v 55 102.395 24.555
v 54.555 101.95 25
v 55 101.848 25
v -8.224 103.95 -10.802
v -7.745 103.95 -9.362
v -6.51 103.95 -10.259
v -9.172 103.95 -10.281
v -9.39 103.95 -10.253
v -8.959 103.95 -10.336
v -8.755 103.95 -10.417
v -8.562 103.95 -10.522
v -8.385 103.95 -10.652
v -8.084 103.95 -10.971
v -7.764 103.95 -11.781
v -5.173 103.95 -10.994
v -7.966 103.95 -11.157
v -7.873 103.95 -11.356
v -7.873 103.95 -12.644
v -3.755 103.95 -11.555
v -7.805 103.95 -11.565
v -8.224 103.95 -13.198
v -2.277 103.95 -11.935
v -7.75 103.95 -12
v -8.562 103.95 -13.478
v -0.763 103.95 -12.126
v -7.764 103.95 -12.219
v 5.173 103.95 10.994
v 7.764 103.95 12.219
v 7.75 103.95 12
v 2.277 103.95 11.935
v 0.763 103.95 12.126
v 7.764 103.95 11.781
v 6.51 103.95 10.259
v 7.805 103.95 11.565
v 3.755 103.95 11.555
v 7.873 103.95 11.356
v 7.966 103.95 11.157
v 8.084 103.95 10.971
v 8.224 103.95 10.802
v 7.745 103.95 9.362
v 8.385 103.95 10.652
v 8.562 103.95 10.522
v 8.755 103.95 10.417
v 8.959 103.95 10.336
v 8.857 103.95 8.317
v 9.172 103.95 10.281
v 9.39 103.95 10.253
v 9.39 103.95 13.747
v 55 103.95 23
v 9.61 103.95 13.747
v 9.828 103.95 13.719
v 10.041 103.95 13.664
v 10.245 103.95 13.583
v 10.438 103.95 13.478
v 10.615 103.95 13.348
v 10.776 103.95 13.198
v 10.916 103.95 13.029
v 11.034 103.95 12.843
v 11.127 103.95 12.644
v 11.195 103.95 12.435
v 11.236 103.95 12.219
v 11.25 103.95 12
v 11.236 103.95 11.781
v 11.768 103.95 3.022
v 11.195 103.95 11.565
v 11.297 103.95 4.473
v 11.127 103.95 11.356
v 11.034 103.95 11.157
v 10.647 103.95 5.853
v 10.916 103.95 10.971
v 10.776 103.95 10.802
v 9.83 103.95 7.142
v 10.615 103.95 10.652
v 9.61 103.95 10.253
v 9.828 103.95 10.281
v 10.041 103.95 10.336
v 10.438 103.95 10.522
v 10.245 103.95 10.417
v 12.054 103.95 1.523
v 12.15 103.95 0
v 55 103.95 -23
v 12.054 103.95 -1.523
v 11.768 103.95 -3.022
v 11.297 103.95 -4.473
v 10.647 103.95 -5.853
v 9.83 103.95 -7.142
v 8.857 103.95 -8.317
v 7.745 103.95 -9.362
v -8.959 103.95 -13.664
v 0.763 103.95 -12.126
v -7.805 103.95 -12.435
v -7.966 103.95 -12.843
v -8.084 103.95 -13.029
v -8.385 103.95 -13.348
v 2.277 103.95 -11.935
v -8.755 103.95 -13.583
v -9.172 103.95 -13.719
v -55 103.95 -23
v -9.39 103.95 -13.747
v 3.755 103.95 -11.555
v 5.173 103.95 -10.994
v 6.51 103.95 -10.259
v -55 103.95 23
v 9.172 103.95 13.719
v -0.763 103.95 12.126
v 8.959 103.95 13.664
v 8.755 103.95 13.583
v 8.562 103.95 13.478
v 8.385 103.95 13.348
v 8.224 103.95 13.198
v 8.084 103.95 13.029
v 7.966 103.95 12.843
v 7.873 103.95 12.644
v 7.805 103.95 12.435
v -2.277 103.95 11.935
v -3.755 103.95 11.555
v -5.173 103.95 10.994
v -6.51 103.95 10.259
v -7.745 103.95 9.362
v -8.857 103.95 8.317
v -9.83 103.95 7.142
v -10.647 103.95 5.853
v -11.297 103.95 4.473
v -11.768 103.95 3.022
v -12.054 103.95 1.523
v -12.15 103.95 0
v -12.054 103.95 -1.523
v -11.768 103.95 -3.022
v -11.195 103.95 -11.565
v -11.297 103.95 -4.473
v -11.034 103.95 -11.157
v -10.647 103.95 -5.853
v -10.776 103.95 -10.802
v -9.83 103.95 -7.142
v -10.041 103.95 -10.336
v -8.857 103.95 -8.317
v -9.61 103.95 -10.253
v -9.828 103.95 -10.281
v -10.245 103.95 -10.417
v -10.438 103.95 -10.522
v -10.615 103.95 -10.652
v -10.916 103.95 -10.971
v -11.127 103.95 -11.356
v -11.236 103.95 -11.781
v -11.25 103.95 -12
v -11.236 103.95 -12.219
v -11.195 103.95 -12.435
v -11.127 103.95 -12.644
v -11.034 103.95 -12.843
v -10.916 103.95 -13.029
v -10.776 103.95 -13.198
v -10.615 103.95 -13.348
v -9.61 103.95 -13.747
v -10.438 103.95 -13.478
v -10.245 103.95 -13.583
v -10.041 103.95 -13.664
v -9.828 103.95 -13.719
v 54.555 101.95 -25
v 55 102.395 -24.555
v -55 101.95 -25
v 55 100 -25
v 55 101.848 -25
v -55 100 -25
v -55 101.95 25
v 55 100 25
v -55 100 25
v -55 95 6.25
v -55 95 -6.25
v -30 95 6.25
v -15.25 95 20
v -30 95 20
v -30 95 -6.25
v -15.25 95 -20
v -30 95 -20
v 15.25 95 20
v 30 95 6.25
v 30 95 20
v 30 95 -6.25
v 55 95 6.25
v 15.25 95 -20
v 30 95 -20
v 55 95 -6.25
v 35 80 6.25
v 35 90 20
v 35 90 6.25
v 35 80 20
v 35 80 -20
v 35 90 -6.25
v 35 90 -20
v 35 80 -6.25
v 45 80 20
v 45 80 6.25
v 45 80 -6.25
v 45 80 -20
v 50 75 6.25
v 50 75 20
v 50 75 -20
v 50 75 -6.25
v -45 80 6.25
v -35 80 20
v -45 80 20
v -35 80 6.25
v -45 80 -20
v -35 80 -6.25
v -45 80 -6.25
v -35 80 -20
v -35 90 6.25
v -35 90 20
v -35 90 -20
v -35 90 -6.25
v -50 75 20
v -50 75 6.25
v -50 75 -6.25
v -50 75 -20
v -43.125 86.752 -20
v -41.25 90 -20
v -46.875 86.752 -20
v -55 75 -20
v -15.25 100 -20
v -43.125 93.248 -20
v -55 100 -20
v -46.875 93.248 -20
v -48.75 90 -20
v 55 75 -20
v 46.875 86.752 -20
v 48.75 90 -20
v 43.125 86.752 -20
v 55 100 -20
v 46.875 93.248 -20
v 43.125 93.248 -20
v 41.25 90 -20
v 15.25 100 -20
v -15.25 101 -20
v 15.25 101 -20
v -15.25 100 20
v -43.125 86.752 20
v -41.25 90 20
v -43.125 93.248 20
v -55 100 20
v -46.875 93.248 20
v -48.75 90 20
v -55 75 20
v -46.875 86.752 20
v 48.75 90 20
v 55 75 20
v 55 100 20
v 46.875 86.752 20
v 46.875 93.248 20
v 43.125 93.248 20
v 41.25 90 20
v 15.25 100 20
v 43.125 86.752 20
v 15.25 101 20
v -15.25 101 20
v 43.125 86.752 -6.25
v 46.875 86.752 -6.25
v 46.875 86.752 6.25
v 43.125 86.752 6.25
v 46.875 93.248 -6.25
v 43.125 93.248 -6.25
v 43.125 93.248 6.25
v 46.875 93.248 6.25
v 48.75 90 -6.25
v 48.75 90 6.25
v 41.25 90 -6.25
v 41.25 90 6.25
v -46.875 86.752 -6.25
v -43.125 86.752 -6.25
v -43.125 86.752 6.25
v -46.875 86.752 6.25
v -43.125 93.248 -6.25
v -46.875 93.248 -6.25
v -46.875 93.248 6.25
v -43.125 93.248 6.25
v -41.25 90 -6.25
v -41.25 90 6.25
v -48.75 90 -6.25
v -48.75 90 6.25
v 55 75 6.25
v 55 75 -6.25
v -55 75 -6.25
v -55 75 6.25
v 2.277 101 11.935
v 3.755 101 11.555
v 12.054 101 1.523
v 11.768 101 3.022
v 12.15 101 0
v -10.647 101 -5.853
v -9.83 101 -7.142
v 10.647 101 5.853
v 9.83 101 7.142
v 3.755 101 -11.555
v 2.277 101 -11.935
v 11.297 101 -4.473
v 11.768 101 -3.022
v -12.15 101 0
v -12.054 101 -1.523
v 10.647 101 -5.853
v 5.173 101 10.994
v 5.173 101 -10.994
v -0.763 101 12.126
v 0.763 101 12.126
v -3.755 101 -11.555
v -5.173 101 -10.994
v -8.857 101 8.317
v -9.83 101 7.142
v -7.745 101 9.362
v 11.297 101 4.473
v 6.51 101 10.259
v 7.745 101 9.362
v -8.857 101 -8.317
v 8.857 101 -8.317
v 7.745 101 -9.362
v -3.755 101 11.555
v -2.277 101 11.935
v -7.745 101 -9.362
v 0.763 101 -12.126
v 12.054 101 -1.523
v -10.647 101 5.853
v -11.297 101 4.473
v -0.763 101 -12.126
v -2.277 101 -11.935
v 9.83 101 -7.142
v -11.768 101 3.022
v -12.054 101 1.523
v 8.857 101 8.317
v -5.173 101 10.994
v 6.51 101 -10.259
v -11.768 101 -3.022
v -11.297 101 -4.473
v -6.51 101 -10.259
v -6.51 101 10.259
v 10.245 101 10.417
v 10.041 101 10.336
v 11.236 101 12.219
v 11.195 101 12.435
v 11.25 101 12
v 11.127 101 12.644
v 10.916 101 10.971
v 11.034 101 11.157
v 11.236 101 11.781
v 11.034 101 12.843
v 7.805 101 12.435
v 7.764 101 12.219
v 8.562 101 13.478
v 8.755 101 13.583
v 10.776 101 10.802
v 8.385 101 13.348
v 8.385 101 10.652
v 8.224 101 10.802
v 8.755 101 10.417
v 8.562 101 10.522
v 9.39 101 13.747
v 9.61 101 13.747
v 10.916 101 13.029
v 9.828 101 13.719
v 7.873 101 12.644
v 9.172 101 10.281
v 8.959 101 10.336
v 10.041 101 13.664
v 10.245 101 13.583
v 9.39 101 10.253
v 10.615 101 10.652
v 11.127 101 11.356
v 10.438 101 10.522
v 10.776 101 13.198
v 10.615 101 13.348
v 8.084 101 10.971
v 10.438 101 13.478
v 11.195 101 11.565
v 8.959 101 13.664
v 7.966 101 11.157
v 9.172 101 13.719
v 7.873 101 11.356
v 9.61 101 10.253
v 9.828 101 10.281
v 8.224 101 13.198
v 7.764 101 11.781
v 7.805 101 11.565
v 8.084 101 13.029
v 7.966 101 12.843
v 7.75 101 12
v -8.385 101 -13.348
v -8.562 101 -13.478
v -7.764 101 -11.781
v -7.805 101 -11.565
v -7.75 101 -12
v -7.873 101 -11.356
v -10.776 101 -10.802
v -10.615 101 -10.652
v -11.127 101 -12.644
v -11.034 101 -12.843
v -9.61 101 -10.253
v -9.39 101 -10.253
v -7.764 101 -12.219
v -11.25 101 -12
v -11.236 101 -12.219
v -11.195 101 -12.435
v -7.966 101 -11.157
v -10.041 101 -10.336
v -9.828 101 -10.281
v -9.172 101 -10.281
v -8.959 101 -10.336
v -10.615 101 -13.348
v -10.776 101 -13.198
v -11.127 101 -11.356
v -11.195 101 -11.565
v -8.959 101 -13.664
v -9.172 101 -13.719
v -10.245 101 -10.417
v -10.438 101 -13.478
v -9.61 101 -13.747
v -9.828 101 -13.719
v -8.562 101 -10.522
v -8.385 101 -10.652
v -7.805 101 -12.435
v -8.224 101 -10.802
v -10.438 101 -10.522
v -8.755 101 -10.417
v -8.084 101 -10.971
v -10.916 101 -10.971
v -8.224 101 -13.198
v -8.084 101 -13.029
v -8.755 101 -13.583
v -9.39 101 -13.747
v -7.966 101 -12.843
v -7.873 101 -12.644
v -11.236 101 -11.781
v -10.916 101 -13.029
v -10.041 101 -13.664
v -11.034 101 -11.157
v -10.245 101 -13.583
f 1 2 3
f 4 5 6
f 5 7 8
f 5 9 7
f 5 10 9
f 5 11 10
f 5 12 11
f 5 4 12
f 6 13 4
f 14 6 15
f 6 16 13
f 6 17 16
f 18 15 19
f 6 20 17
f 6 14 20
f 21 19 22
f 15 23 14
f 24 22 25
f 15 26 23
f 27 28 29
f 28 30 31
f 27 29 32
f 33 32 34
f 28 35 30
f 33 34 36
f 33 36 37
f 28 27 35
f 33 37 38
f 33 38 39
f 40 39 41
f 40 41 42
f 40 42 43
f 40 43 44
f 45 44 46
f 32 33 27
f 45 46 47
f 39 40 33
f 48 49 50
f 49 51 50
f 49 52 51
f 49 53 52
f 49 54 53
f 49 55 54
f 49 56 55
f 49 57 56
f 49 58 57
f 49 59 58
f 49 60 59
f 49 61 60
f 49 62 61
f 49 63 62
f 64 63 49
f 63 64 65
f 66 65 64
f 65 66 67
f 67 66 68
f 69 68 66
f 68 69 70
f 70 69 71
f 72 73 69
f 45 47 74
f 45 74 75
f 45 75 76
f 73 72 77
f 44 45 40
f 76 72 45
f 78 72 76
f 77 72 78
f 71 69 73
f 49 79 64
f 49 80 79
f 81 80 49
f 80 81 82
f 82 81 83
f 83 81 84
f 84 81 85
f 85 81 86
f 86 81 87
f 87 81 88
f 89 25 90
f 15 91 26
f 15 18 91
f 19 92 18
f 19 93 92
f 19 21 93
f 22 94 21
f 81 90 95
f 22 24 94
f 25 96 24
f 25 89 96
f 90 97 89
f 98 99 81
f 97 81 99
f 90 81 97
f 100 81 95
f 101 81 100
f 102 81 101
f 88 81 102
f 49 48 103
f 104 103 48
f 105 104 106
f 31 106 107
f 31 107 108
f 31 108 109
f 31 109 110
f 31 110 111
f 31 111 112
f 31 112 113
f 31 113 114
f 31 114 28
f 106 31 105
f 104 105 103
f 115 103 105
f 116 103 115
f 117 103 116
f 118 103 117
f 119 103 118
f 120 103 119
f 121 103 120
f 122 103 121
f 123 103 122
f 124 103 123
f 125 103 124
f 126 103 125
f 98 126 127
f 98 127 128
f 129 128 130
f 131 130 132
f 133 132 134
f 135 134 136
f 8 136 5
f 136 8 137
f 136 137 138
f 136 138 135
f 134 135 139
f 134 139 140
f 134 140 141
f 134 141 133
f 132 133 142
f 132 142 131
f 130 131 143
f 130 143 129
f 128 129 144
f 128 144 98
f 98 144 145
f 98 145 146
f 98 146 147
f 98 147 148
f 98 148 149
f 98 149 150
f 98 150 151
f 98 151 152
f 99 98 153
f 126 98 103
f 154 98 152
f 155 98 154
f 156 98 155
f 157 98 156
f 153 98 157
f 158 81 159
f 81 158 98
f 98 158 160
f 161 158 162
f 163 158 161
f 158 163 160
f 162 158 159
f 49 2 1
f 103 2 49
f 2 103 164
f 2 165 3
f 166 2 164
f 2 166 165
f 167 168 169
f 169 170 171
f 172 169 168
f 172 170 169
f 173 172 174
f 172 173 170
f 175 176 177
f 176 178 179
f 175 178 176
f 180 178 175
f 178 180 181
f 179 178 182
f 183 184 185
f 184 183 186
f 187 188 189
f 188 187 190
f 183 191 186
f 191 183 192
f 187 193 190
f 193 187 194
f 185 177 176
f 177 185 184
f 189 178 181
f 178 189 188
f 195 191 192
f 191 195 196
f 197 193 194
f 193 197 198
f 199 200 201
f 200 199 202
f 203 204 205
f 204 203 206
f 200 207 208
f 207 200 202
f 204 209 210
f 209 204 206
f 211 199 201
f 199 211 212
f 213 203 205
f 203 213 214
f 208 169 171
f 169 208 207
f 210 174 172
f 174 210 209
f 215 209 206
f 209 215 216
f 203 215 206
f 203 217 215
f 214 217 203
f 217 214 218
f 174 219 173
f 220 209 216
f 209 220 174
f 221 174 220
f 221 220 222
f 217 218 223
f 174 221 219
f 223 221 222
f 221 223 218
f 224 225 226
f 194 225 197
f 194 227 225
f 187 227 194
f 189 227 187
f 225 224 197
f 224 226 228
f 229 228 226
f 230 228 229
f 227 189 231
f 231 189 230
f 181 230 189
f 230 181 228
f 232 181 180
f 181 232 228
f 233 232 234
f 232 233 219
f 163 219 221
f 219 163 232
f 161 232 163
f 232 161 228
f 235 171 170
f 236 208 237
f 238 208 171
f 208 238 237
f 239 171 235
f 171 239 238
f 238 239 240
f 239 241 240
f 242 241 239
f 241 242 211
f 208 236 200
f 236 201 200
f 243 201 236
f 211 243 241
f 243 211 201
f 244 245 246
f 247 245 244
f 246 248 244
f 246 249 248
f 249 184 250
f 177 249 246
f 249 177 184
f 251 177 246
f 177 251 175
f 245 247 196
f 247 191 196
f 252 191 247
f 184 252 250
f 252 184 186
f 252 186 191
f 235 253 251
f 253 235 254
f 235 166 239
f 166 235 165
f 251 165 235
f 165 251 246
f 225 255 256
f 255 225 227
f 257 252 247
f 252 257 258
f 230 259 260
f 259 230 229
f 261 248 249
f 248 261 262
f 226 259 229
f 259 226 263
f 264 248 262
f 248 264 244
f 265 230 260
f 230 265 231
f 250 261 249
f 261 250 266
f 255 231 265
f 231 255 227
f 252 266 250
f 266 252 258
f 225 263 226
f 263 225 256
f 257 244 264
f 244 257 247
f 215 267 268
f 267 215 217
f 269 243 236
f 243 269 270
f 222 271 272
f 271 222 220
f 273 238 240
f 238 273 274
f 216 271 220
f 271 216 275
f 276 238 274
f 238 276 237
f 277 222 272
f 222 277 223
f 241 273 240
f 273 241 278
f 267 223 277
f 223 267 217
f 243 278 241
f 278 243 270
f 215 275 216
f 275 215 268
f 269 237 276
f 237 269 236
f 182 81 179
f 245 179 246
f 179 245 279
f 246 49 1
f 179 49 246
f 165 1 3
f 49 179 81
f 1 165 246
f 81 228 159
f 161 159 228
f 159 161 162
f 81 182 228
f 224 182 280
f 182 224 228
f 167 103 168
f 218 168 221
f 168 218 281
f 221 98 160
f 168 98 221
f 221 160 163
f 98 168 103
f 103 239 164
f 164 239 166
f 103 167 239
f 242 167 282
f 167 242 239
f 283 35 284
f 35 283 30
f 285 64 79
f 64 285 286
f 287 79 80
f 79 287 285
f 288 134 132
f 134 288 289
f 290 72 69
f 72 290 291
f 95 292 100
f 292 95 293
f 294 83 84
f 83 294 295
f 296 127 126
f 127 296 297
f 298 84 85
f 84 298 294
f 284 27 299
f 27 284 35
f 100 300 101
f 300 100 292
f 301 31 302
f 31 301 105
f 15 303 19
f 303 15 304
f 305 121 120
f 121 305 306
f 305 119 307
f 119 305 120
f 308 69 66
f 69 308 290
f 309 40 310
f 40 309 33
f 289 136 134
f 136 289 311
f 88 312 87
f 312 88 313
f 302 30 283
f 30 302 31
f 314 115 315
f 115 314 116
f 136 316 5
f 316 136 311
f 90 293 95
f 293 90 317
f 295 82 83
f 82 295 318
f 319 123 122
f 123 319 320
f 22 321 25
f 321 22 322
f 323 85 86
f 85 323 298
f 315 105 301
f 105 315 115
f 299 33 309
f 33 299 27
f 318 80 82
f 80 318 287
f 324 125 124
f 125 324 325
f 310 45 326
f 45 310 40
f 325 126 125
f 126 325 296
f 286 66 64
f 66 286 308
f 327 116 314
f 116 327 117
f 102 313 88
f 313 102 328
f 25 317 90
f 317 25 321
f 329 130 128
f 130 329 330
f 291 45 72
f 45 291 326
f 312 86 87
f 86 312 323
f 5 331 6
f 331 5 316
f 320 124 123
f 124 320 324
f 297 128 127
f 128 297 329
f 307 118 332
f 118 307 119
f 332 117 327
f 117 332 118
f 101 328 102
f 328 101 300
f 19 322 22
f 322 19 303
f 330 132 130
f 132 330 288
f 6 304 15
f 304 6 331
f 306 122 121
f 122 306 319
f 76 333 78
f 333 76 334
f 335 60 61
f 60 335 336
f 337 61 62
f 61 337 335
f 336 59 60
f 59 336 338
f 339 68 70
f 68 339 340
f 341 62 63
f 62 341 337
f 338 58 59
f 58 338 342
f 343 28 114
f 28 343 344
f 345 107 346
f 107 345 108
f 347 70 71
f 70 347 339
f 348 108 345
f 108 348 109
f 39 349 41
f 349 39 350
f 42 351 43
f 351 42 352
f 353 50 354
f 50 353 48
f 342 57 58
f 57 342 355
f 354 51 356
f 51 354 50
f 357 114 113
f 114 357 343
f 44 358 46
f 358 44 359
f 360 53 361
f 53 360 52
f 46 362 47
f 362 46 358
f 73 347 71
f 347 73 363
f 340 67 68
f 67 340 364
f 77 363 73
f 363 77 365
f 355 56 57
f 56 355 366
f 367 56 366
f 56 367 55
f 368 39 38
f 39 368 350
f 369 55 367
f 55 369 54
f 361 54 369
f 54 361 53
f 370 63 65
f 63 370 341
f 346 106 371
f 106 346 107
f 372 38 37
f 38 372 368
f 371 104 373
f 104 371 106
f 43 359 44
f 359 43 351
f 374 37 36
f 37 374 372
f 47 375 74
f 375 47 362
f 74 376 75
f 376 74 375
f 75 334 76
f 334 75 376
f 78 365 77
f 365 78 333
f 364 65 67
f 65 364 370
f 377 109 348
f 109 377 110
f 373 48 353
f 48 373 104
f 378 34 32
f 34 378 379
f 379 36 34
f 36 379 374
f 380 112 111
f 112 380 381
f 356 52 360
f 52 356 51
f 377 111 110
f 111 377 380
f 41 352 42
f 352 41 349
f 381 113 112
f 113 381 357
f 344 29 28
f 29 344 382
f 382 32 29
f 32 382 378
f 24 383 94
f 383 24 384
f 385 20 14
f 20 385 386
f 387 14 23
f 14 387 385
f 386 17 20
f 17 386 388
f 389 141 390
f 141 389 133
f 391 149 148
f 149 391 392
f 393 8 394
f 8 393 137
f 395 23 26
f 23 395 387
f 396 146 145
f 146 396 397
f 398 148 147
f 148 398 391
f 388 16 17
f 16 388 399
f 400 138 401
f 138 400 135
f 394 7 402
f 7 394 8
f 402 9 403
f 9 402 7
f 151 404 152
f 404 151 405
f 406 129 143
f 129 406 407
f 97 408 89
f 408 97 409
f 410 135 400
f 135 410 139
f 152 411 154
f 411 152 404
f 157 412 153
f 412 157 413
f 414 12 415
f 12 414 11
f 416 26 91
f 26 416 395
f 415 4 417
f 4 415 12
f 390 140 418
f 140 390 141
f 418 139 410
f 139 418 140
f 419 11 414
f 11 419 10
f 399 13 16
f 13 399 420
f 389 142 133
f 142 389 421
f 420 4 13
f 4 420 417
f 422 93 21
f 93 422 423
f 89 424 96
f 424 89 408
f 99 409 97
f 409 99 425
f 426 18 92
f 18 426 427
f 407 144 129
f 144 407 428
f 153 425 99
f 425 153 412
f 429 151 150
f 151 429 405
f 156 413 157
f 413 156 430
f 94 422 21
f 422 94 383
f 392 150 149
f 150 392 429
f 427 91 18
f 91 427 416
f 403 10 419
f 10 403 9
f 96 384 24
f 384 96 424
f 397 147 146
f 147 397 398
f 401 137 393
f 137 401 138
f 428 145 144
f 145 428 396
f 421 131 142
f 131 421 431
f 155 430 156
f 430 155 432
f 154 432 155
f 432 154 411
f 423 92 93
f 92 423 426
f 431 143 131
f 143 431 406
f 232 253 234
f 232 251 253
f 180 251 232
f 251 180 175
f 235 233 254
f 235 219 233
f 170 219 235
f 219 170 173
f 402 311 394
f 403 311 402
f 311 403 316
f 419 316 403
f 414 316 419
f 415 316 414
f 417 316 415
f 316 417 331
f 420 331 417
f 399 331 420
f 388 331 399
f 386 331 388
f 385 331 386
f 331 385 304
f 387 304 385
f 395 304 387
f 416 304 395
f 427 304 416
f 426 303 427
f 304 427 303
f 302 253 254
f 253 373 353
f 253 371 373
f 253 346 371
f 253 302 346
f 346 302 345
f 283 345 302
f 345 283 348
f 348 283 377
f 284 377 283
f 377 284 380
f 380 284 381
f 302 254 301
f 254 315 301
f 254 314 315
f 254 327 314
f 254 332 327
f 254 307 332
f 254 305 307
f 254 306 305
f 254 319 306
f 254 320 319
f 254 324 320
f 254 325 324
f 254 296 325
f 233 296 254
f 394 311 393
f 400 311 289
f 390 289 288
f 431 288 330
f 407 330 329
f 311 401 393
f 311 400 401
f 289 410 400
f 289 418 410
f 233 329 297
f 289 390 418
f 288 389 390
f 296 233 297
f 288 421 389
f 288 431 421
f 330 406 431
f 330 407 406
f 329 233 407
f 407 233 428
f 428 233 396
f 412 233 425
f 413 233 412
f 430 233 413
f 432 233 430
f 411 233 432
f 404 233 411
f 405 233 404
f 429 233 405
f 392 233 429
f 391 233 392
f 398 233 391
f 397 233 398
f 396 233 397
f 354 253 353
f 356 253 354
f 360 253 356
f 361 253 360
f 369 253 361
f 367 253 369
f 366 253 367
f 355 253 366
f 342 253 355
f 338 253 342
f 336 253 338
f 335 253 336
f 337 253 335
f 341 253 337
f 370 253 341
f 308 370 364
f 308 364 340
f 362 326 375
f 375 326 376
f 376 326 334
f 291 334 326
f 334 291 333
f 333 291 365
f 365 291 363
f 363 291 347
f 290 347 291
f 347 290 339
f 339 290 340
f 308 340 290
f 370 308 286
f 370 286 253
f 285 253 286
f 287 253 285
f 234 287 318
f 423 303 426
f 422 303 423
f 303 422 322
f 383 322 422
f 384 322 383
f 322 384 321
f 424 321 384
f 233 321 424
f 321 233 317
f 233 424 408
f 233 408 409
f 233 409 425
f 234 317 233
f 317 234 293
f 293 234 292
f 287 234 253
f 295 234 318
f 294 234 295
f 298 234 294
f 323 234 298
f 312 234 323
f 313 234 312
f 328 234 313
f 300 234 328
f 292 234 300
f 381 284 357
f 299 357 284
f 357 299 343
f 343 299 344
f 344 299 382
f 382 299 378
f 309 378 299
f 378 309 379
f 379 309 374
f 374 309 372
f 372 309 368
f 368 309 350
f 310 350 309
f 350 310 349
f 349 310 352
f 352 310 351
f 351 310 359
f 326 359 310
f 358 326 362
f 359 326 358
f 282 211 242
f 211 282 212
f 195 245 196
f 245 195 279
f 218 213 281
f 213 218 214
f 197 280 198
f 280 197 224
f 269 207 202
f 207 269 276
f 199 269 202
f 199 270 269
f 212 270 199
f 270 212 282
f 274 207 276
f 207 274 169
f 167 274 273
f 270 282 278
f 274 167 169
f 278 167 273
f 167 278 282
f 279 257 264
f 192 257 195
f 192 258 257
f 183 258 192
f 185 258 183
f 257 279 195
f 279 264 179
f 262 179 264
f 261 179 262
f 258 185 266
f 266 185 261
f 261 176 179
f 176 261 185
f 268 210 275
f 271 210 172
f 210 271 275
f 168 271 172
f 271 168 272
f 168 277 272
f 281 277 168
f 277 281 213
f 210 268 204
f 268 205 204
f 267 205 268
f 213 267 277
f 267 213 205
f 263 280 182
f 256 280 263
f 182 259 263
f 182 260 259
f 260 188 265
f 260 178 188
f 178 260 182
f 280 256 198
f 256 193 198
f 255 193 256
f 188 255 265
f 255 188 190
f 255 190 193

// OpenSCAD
// file: frame-middle.scad
/*
 * SPDX-FileCopyrightText: © 2023 Brian S. Stephan <bss@incorporeal.org>
 * SPDX-License-Identifier: GPL-3.0-or-later
 */

include <parameters.scad>
include <components.scad>

module base_middle_frame() {
	difference() {
		mid_frame();
		// chop the left and right edge off
		mid_side_chopper();
		mirror([1, 0, 0]) mid_side_chopper();
	}
}

module middle_frame() {
	difference() {
		base_middle_frame();
		// connection holes to other frames
		frame_connection_holes();
		mirror([1, 0, 0]) frame_connection_holes();

		// cable routing holes
		translate([-30,0,0]) frame_cable_routing_hole();
		translate([30,0,0]) mirror([1, 0, 0]) frame_cable_routing_hole();

		// neutrik mounts for connector, switches
		translate([0, (frame_y/2)-neutrik_panel_thickness, 0]) rotate([90, 0, 0]) neutrik_d_mount();
		translate([0, (frame_y/2)-neutrik_panel_thickness-4, 0]) frame_cutout();
		//translate([-40, (frame_y/2)-neutrik_panel_thickness, 0]) rotate([90, 0, 0]) neutrik_d_mount();
		//translate([-40, (frame_y/2)-neutrik_panel_thickness-4, 0]) frame_cutout();
		//translate([40, (frame_y/2)-neutrik_panel_thickness, 0]) rotate([90, 0, 0]) neutrik_d_mount();
		//translate([40, (frame_y/2)-neutrik_panel_thickness-4, 0]) frame_cutout();
	}
}

middle_frame();
// file: parameters.scad
/*
 * SPDX-FileCopyrightText: © 2023 Brian S. Stephan <bss@incorporeal.org>
 * SPDX-License-Identifier: GPL-3.0-or-later
 */

// adjustments
hole_tolerance = 0.15;

// M2
m2_screw_selftap_radius = 0.95;

// M3
m3_screw_selftap_radius = 1.3;

// M4
m4_bolt_radius = 2 + hole_tolerance;
m4_bolt_countersink_radius = 6.1 + hole_tolerance;
m4_bolt_hex_exterior_radius = 3.6 + hole_tolerance;

// 24mm button
small_button_radius = 12 + hole_tolerance;

// 30mm button
big_button_radius = 15 + hole_tolerance;

// JLF mount dimensions
lever_mount_x = 53;
lever_mount_y = 95;
lever_mount_z = 2;

// standard lever hole
lever_plate_hole = 12;


// case dimensions
// base frame box. reminder: top of inside (including mounts) is chopped by panel_z for plates
frame_x = 208;
frame_y = 208;
frame_z = 50;

// middle piece dimensions
mid_frame_x = 118;

/*
frame_x = 233;
frame_y = 208;
frame_z = 57;
*/



// degree to which the extended frame pieces stick out from the end of the frame
frame_extension_x = 25;
frame_extension_y = 25;

// this sinks the bottom and top of the frame inward a bit, and is used to math out two shapes
// when creating the frame box / overhang panel
frame_bevel_height = 2;
overhang_panel_bevel_height = 1;

frame_center_to_neutrik = 70;

// depth of the "lip" of the frame that the top plate sets into/supports the overhang
frame_wall = 4;

// width of the column in the frame corners to support the hex bolt
frame_mount_column_width = 20;

// per neutrik (mm)
neutrik_panel_thickness = 3;

// top plate, which can either be the whole plate ("inset") or the mounting frame for a plate that overhangs
panel_x = frame_x - (frame_wall * 2);
panel_y = frame_y - (frame_wall * 2);
panel_z = 5;
mid_panel_x = mid_frame_x - (frame_wall * 2);


// how much the top plate x/y is expanded to overhang the frame
// note that this is relative to the top plate (so the wall is added back)
panel_overhang_amount = 8.5;
overhang_panel_x = panel_x + (frame_wall * 2) + (panel_overhang_amount * 2);
overhang_panel_y = panel_y + (frame_wall * 2) + (panel_overhang_amount * 2);
// mid overhang
mid_overhang_panel_x = mid_panel_x + (frame_wall * 2) + (panel_overhang_amount * 2);


panel_to_frame_point_x = (panel_x/2)-10;
panel_to_frame_point_y = (panel_y/2)-10;
mid_panel_to_frame_point_x = (mid_panel_x/2)-10;


// frame interior that supports the top plates
panel_support_width = 5;

// neutrik D screw holes
neutrik_d_screw_radius = 1.6 + hole_tolerance;
neutrik_d_radius = 12 + hole_tolerance;

// additional button radius for decorative panels, etc.
decorative_radius_scale = 1.75;
jumbo_decorative_radius_scale = 2;
// main file
/*
 * SPDX-FileCopyrightText: © 2024 Brian S. Stephan <bss@incorporeal.org>
 * SPDX-License-Identifier: GPL-3.0-or-later
 */

include <parameters.scad>
include <components.scad>
use <frame-middle.scad>

module top_middle_frame_piece() {
	piece_width = panel_support_width+frame_wall+frame_mount_column_width;
	intersection() {
		middle_frame();
		difference() {
			// include the whole top wall (including mount columns)
			translate([0, (frame_y/2)-(piece_width/2), 0]) cube([frame_x, piece_width, frame_z], center=true);
			// ...minus the frame wall and lip on the left
			translate([-frame_x/2+frame_wall/2, 0, 0])
				cube([frame_wall, frame_y, frame_z], center=true);
			// ...minus a slot for the combining piece to go into
			cube([frame_x, frame_y-(panel_support_width+frame_wall)*2, frame_z/4], center=true);
		}
	}
}

top_middle_frame_piece();
